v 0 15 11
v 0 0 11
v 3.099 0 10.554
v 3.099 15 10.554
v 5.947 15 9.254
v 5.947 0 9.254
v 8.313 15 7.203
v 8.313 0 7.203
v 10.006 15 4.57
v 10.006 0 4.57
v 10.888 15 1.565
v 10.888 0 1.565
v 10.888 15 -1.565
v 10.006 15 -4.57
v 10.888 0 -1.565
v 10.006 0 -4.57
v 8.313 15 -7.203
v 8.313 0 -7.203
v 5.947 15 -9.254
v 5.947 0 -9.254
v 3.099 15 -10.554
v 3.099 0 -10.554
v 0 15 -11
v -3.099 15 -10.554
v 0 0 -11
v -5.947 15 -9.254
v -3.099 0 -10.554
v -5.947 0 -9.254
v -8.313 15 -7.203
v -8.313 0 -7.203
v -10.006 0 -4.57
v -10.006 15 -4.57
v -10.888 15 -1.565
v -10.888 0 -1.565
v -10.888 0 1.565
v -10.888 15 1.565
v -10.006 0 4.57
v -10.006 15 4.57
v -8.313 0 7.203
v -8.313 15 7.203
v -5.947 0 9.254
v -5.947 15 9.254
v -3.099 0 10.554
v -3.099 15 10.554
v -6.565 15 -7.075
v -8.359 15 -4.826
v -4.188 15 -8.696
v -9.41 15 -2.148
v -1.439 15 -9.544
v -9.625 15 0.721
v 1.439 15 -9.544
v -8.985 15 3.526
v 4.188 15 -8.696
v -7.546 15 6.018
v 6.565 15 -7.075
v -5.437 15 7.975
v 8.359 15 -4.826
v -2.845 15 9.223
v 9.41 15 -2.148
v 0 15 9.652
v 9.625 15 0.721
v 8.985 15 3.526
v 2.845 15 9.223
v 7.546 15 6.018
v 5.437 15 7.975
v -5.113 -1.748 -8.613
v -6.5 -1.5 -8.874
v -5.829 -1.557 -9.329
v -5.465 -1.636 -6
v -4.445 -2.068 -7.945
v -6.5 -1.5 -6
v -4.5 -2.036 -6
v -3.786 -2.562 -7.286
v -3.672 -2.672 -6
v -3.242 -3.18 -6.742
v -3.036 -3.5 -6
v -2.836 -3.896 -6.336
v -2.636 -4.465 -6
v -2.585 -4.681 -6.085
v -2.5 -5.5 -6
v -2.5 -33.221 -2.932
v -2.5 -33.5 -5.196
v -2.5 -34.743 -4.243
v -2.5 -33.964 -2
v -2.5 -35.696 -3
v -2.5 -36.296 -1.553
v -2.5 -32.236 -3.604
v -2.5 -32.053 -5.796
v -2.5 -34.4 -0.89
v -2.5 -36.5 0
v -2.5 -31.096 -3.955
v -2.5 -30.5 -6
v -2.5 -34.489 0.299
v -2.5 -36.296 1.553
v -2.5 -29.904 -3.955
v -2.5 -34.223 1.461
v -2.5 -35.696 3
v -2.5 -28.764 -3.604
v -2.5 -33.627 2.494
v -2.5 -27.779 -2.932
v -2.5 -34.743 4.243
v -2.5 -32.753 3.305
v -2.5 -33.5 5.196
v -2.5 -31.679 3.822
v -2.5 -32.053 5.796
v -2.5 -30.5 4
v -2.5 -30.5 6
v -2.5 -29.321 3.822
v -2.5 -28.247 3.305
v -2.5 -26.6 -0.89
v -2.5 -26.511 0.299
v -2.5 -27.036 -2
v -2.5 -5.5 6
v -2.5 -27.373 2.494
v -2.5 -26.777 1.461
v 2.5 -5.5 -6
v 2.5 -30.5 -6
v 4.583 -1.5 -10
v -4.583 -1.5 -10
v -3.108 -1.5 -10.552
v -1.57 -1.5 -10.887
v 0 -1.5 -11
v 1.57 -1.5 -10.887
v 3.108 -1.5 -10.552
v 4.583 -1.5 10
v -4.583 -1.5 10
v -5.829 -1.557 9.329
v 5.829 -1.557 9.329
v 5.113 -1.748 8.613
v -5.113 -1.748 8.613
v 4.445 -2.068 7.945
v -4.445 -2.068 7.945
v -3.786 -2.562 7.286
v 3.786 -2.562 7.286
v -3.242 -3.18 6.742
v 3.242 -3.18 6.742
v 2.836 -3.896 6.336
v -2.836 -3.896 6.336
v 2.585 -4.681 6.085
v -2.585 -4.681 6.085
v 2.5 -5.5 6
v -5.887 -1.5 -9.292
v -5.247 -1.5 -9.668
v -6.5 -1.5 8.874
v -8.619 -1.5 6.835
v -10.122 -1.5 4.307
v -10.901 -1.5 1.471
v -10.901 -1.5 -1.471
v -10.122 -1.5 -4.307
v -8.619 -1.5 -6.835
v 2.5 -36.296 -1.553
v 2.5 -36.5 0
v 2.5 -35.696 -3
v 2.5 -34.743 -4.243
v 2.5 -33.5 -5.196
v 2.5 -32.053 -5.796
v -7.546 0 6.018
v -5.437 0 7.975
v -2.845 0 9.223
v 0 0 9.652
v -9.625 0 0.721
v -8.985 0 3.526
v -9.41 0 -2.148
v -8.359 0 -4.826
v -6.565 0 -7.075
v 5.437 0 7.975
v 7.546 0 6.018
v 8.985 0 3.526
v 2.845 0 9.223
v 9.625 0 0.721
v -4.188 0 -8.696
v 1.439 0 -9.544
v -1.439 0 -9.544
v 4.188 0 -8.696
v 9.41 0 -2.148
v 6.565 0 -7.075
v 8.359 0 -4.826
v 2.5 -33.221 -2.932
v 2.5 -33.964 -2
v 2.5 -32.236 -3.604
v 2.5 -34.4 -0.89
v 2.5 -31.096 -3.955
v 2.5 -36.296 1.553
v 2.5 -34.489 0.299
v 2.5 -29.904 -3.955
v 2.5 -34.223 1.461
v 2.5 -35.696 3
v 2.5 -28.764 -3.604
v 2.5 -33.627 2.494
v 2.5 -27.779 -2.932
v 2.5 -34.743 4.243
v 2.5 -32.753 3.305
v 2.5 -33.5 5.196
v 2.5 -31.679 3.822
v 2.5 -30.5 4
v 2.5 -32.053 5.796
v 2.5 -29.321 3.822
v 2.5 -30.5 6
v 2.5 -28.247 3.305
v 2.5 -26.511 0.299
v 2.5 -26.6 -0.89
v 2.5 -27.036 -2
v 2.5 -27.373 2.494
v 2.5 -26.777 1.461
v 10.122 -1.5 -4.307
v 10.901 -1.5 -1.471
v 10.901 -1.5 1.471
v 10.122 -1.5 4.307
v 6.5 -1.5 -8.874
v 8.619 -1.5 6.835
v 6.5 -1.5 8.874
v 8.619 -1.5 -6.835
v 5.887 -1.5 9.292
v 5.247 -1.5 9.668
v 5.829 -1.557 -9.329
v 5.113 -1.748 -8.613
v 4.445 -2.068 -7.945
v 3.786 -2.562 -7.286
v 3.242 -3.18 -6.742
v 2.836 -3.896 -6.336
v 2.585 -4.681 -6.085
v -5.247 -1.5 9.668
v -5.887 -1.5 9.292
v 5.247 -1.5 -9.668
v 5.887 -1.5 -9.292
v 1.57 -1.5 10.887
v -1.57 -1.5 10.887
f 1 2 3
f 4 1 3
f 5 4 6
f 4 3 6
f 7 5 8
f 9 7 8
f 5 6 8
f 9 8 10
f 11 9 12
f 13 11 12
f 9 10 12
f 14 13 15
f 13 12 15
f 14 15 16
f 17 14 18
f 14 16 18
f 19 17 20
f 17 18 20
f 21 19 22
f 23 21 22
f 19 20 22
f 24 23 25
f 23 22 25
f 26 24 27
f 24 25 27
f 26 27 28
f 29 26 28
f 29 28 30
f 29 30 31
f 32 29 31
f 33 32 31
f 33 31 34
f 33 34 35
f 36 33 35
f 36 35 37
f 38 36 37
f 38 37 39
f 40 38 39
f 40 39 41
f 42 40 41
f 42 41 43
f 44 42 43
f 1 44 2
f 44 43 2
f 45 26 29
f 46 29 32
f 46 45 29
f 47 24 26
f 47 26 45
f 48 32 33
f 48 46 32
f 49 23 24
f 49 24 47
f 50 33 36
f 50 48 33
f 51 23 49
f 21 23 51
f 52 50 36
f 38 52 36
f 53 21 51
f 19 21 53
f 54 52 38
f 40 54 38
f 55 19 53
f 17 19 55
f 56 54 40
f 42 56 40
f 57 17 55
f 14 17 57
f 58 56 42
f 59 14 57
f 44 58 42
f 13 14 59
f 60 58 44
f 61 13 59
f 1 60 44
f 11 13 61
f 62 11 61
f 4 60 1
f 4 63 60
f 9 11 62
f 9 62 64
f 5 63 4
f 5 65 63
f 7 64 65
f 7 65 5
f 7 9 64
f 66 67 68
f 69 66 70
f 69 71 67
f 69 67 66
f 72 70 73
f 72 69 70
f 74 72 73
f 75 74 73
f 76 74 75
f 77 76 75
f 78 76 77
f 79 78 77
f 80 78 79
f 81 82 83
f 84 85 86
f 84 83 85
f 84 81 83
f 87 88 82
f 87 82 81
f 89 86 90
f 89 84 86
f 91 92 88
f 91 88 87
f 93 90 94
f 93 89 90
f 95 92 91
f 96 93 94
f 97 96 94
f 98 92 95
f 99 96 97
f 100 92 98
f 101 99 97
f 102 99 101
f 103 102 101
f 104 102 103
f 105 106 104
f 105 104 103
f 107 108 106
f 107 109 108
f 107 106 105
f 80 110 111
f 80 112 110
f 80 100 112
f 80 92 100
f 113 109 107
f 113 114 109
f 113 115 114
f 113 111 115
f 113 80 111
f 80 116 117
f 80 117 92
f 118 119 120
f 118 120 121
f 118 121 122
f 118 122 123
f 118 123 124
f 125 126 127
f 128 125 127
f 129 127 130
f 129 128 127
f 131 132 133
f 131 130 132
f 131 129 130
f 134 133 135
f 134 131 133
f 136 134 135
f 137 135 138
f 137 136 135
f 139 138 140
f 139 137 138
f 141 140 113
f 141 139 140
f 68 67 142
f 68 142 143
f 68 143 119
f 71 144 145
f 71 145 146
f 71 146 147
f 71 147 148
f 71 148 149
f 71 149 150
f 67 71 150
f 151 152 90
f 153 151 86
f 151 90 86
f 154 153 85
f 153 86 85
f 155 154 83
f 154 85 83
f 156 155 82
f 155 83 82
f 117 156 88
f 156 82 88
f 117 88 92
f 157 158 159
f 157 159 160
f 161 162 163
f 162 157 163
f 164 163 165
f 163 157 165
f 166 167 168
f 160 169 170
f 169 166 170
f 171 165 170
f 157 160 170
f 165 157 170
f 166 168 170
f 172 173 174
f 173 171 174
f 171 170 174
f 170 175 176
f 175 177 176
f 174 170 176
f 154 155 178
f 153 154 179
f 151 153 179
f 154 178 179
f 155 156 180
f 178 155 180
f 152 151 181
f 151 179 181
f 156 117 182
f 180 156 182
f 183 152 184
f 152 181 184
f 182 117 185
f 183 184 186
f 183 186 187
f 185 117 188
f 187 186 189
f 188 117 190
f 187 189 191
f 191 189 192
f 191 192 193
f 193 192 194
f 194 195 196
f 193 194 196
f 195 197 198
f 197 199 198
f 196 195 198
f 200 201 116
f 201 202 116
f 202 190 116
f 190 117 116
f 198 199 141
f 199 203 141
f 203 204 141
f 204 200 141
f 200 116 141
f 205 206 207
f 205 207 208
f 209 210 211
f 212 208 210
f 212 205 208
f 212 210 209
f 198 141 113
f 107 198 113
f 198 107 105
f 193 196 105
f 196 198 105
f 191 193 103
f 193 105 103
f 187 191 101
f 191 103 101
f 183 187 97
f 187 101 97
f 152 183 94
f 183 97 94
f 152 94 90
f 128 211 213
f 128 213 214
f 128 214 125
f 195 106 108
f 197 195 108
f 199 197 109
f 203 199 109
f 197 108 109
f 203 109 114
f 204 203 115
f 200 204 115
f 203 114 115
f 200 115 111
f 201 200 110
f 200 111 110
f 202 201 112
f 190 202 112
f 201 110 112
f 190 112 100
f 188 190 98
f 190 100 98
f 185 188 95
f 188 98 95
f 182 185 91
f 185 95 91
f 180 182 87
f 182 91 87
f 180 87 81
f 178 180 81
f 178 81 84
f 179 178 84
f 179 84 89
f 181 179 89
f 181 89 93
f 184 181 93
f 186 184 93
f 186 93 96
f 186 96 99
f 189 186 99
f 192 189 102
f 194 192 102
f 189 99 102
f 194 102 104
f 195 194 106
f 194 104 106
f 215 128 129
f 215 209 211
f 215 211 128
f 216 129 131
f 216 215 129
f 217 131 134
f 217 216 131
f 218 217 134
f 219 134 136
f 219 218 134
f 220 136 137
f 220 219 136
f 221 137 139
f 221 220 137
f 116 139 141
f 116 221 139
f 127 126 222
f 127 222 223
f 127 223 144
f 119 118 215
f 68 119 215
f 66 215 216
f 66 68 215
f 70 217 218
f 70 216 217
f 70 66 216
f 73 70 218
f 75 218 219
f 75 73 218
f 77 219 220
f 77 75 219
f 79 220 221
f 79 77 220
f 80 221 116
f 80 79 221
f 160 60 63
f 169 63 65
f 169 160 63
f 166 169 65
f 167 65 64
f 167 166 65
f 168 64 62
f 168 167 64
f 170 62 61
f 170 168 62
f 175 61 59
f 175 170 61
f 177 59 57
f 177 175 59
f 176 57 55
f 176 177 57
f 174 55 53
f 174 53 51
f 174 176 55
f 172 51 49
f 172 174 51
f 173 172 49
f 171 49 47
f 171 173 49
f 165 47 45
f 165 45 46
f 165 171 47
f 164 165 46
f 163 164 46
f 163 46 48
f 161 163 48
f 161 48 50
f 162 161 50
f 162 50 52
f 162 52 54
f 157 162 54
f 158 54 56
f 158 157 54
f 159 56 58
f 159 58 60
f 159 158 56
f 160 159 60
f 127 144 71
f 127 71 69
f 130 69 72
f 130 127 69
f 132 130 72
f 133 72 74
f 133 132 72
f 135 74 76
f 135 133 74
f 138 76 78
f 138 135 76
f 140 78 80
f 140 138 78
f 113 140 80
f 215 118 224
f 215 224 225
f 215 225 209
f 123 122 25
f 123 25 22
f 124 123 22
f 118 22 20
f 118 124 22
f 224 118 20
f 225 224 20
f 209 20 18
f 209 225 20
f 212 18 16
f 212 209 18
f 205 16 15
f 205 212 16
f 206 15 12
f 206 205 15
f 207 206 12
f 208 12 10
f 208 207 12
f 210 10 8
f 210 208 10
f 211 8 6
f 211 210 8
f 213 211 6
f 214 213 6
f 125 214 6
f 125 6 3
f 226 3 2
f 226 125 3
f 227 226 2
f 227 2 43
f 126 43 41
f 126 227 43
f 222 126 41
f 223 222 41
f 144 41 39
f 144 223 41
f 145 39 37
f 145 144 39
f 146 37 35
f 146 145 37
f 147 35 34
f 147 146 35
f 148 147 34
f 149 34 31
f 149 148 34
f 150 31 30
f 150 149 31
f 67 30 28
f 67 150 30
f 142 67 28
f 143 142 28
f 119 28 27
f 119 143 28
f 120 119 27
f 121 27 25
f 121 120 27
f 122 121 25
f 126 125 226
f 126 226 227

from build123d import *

# Parameters (mm, degrees)
SKETCH1_R           = 11
SKETCH1_R_2         = 9.652
BOSS_EXTRUDE1_DEPTH = 15
BOSS_EXTRUDE2_START = 1.5
SKETCH2_R           = 11
BOSS_EXTRUDE2_DEPTH = 1.5
SKETCH4_W           = 5
SKETCH4_H           = 12
BOSS_EXTRUDE4_DEPTH = 35
SKETCH5_R           = 4
CUT_EXTRUDE1_DEPTH  = 5
CUT_EXTRUDE2_DEPTH  = 41.441315508
FILLET1_R           = 4


with BuildPart() as part:
    # Sketch1 → Boss-Extrude1 (new body)
    with BuildSketch(Plane(origin=(0, 0, 0), x_dir=(1, 0, 0), z_dir=(0, 1, 0))):
        with Locations(Location((0, 0, 0), (0, 0, 270))):
            Circle(SKETCH1_R)
        with Locations(Location((0, 0, 0), (0, 0, 270))):
            Circle(SKETCH1_R_2, mode=Mode.SUBTRACT)
    extrude(amount=BOSS_EXTRUDE1_DEPTH)

    # Sketch2 → Boss-Extrude2 (add)
    with BuildSketch(Plane.XZ.offset(BOSS_EXTRUDE2_START)):
        with Locations(Location((0, 0, 0), (0, 0, 270))):
            Circle(SKETCH2_R)
    extrude(amount=-BOSS_EXTRUDE2_DEPTH)

    # Sketch4 → Boss-Extrude4 (add)
    with BuildSketch(Plane.XZ.offset(1.5)):
        Rectangle(SKETCH4_W, SKETCH4_H)
    extrude(amount=BOSS_EXTRUDE4_DEPTH)

    # Sketch5 → Cut-Extrude1 (cut)
    with BuildSketch(Plane.ZY.offset(2.5)):
        with Locations((0, -30.5)):
            Circle(SKETCH5_R)
    extrude(amount=-CUT_EXTRUDE1_DEPTH, mode=Mode.SUBTRACT)

    # Sketch6 → Cut-Extrude2 (cut, through all)
    with BuildSketch(Plane.ZY.offset(2.5)):
        with BuildLine():
            Line((-6, -30.5), (-6, -36.5))
            ThreePointArc((-6, -36.5), (0, -38.985281374), (6, -36.5))
            Line((6, -36.5), (6, -30.5))
            ThreePointArc((6, -30.5), (0, -36.5), (-6, -30.5))
        make_face()
    extrude(amount=-CUT_EXTRUDE2_DEPTH, mode=Mode.SUBTRACT)

    # Fillet1
    # the kernel refuses this fillet: 4 mm, written as the material it adds along each edge
    with BuildSketch(Plane(origin=(2.5, -1.5, -6), x_dir=(1, 0, 0), z_dir=(0, 0, 1)), Plane(origin=(-2.5, -1.5, 6), x_dir=(-1, 0, 0), z_dir=(0, 0, -1))) as fillet1_piece_1:
        with BuildLine():
            CenterArc((FILLET1_R, -FILLET1_R), FILLET1_R, 90, 90)
            Line((0, -FILLET1_R), (0, 0))
            Line((0, 0), (FILLET1_R, 0))
        make_face()
    extrude(amount=12)
    with BuildSketch(Plane(origin=(2.5, -1.5, 6), x_dir=(0, 0, 1), z_dir=(-1, 0, 0)), Plane(origin=(-2.5, -1.5, -6), x_dir=(0, 0, -1), z_dir=(1, 0, 0))) as fillet1_piece_2:
        with BuildLine():
            CenterArc((FILLET1_R, -FILLET1_R), FILLET1_R, 90, 90)
            Line((0, -FILLET1_R), (0, 0))
            Line((0, 0), (FILLET1_R, 0))
        make_face()
    extrude(amount=5)
    with BuildSketch(Plane(origin=(-2.5, -1.5, -6), x_dir=(0, 0, -1), z_dir=(1, 0, 0))) as fillet1_piece_3a_section:
        with BuildLine():
            CenterArc((FILLET1_R, -FILLET1_R), FILLET1_R, 90, 90)
            Line((0, -FILLET1_R), (0, 0))
            Line((0, 0), (FILLET1_R, 0))
        make_face()
    fillet1_piece_3a = extrude(amount=15, mode=Mode.PRIVATE)
    fillet1_piece_3a = fillet1_piece_3a & Plane(origin=(0, -2.470762695, 0), x_dir=(0, 0, -1), z_dir=(0, -1, 0)) * Cylinder(11, 46, mode=Mode.PRIVATE)
    fillet1_piece_3a = split(fillet1_piece_3a, bisect_by=Plane(origin=(2.5, -2.470762695, -6.788618782), z_dir=(1, 0, 0)), keep=Keep.TOP, mode=Mode.PRIVATE)
    with BuildSketch(Plane(origin=(2.5, -1.5, -16), x_dir=(1, 0, 0), z_dir=(0, 0, 1))) as fillet1_piece_3b_section:
        with BuildLine():
            CenterArc((FILLET1_R, -FILLET1_R), FILLET1_R, 90, 90)
            Line((0, -FILLET1_R), (0, 0))
            Line((0, 0), (FILLET1_R, 0))
        make_face()
    fillet1_piece_3b = extrude(amount=22, mode=Mode.PRIVATE)
    fillet1_piece_3b = fillet1_piece_3b & Plane(origin=(0, -2.441237168, 0), x_dir=(0, 0, -1), z_dir=(0, -1, 0)) * Cylinder(11, 60, mode=Mode.PRIVATE)
    fillet1_piece_3b = split(fillet1_piece_3b, bisect_by=Plane(origin=(3.34113706, -2.441237168, -6), z_dir=(0, 0, -1)), keep=Keep.TOP, mode=Mode.PRIVATE)
    fillet1_piece_3 = fillet1_piece_3a & fillet1_piece_3b
    add(fillet1_piece_3)
    with BuildSketch(Plane(origin=(2.5, -1.5, -6), x_dir=(1, 0, 0), z_dir=(0, 0, 1))) as fillet1_piece_4a_section:
        with BuildLine():
            CenterArc((FILLET1_R, -FILLET1_R), FILLET1_R, 90, 90)
            Line((0, -FILLET1_R), (0, 0))
            Line((0, 0), (FILLET1_R, 0))
        make_face()
    fillet1_piece_4a = extrude(amount=22, mode=Mode.PRIVATE)
    fillet1_piece_4a = fillet1_piece_4a & Plane(origin=(0, -2.441236356, 0), x_dir=(0, 0, -1), z_dir=(0, -1, 0)) * Cylinder(11, 60, mode=Mode.PRIVATE)
    fillet1_piece_4a = split(fillet1_piece_4a, bisect_by=Plane(origin=(3.341136574, -2.441236356, 6), z_dir=(0, 0, 1)), keep=Keep.TOP, mode=Mode.PRIVATE)
    with BuildSketch(Plane(origin=(12.5, -1.5, 6), x_dir=(0, 0, 1), z_dir=(-1, 0, 0))) as fillet1_piece_4b_section:
        with BuildLine():
            CenterArc((FILLET1_R, -FILLET1_R), FILLET1_R, 90, 90)
            Line((0, -FILLET1_R), (0, 0))
            Line((0, 0), (FILLET1_R, 0))
        make_face()
    fillet1_piece_4b = extrude(amount=15, mode=Mode.PRIVATE)
    fillet1_piece_4b = fillet1_piece_4b & Plane(origin=(0, -2.470761842, 0), x_dir=(0, 0, -1), z_dir=(0, -1, 0)) * Cylinder(11, 46, mode=Mode.PRIVATE)
    fillet1_piece_4b = split(fillet1_piece_4b, bisect_by=Plane(origin=(2.5, -2.470761842, 6.78861866), z_dir=(1, 0, 0)), keep=Keep.TOP, mode=Mode.PRIVATE)
    fillet1_piece_4 = fillet1_piece_4a & fillet1_piece_4b
    add(fillet1_piece_4)
    with BuildSketch(Plane(origin=(2.5, -1.5, 6), x_dir=(0, 0, 1), z_dir=(-1, 0, 0))) as fillet1_piece_5a_section:
        with BuildLine():
            CenterArc((FILLET1_R, -FILLET1_R), FILLET1_R, 90, 90)
            Line((0, -FILLET1_R), (0, 0))
            Line((0, 0), (FILLET1_R, 0))
        make_face()
    fillet1_piece_5a = extrude(amount=15, mode=Mode.PRIVATE)
    fillet1_piece_5a = fillet1_piece_5a & Plane(origin=(0, -2.470762695, 0), x_dir=(0, 0, -1), z_dir=(0, -1, 0)) * Cylinder(11, 46, mode=Mode.PRIVATE)
    fillet1_piece_5a = split(fillet1_piece_5a, bisect_by=Plane(origin=(-2.5, -2.470762695, 6.788618782), z_dir=(-1, 0, 0)), keep=Keep.TOP, mode=Mode.PRIVATE)
    with BuildSketch(Plane(origin=(-2.5, -1.5, 16), x_dir=(-1, 0, 0), z_dir=(0, 0, -1))) as fillet1_piece_5b_section:
        with BuildLine():
            CenterArc((FILLET1_R, -FILLET1_R), FILLET1_R, 90, 90)
            Line((0, -FILLET1_R), (0, 0))
            Line((0, 0), (FILLET1_R, 0))
        make_face()
    fillet1_piece_5b = extrude(amount=22, mode=Mode.PRIVATE)
    fillet1_piece_5b = fillet1_piece_5b & Plane(origin=(0, -2.441237168, 0), x_dir=(0, 0, -1), z_dir=(0, -1, 0)) * Cylinder(11, 60, mode=Mode.PRIVATE)
    fillet1_piece_5b = split(fillet1_piece_5b, bisect_by=Plane(origin=(-3.34113706, -2.441237168, 6), z_dir=(0, 0, 1)), keep=Keep.TOP, mode=Mode.PRIVATE)
    fillet1_piece_5 = fillet1_piece_5a & fillet1_piece_5b
    add(fillet1_piece_5)
    with BuildSketch(Plane(origin=(-12.5, -1.5, -6), x_dir=(0, 0, -1), z_dir=(1, 0, 0))) as fillet1_piece_6a_section:
        with BuildLine():
            CenterArc((FILLET1_R, -FILLET1_R), FILLET1_R, 90, 90)
            Line((0, -FILLET1_R), (0, 0))
            Line((0, 0), (FILLET1_R, 0))
        make_face()
    fillet1_piece_6a = extrude(amount=15, mode=Mode.PRIVATE)
    fillet1_piece_6a = fillet1_piece_6a & Plane(origin=(0, -2.470761842, 0), x_dir=(0, 0, -1), z_dir=(0, -1, 0)) * Cylinder(11, 46, mode=Mode.PRIVATE)
    fillet1_piece_6a = split(fillet1_piece_6a, bisect_by=Plane(origin=(-2.5, -2.470761842, -6.788618661), z_dir=(-1, 0, 0)), keep=Keep.TOP, mode=Mode.PRIVATE)
    with BuildSketch(Plane(origin=(-2.5, -1.5, 6), x_dir=(-1, 0, 0), z_dir=(0, 0, -1))) as fillet1_piece_6b_section:
        with BuildLine():
            CenterArc((FILLET1_R, -FILLET1_R), FILLET1_R, 90, 90)
            Line((0, -FILLET1_R), (0, 0))
            Line((0, 0), (FILLET1_R, 0))
        make_face()
    fillet1_piece_6b = extrude(amount=22, mode=Mode.PRIVATE)
    fillet1_piece_6b = fillet1_piece_6b & Plane(origin=(0, -2.441236356, 0), x_dir=(0, 0, -1), z_dir=(0, -1, 0)) * Cylinder(11, 60, mode=Mode.PRIVATE)
    fillet1_piece_6b = split(fillet1_piece_6b, bisect_by=Plane(origin=(-3.341136574, -2.441236356, -6), z_dir=(0, 0, -1)), keep=Keep.TOP, mode=Mode.PRIVATE)
    fillet1_piece_6 = fillet1_piece_6a & fillet1_piece_6b
    add(fillet1_piece_6)


solid = part.part
